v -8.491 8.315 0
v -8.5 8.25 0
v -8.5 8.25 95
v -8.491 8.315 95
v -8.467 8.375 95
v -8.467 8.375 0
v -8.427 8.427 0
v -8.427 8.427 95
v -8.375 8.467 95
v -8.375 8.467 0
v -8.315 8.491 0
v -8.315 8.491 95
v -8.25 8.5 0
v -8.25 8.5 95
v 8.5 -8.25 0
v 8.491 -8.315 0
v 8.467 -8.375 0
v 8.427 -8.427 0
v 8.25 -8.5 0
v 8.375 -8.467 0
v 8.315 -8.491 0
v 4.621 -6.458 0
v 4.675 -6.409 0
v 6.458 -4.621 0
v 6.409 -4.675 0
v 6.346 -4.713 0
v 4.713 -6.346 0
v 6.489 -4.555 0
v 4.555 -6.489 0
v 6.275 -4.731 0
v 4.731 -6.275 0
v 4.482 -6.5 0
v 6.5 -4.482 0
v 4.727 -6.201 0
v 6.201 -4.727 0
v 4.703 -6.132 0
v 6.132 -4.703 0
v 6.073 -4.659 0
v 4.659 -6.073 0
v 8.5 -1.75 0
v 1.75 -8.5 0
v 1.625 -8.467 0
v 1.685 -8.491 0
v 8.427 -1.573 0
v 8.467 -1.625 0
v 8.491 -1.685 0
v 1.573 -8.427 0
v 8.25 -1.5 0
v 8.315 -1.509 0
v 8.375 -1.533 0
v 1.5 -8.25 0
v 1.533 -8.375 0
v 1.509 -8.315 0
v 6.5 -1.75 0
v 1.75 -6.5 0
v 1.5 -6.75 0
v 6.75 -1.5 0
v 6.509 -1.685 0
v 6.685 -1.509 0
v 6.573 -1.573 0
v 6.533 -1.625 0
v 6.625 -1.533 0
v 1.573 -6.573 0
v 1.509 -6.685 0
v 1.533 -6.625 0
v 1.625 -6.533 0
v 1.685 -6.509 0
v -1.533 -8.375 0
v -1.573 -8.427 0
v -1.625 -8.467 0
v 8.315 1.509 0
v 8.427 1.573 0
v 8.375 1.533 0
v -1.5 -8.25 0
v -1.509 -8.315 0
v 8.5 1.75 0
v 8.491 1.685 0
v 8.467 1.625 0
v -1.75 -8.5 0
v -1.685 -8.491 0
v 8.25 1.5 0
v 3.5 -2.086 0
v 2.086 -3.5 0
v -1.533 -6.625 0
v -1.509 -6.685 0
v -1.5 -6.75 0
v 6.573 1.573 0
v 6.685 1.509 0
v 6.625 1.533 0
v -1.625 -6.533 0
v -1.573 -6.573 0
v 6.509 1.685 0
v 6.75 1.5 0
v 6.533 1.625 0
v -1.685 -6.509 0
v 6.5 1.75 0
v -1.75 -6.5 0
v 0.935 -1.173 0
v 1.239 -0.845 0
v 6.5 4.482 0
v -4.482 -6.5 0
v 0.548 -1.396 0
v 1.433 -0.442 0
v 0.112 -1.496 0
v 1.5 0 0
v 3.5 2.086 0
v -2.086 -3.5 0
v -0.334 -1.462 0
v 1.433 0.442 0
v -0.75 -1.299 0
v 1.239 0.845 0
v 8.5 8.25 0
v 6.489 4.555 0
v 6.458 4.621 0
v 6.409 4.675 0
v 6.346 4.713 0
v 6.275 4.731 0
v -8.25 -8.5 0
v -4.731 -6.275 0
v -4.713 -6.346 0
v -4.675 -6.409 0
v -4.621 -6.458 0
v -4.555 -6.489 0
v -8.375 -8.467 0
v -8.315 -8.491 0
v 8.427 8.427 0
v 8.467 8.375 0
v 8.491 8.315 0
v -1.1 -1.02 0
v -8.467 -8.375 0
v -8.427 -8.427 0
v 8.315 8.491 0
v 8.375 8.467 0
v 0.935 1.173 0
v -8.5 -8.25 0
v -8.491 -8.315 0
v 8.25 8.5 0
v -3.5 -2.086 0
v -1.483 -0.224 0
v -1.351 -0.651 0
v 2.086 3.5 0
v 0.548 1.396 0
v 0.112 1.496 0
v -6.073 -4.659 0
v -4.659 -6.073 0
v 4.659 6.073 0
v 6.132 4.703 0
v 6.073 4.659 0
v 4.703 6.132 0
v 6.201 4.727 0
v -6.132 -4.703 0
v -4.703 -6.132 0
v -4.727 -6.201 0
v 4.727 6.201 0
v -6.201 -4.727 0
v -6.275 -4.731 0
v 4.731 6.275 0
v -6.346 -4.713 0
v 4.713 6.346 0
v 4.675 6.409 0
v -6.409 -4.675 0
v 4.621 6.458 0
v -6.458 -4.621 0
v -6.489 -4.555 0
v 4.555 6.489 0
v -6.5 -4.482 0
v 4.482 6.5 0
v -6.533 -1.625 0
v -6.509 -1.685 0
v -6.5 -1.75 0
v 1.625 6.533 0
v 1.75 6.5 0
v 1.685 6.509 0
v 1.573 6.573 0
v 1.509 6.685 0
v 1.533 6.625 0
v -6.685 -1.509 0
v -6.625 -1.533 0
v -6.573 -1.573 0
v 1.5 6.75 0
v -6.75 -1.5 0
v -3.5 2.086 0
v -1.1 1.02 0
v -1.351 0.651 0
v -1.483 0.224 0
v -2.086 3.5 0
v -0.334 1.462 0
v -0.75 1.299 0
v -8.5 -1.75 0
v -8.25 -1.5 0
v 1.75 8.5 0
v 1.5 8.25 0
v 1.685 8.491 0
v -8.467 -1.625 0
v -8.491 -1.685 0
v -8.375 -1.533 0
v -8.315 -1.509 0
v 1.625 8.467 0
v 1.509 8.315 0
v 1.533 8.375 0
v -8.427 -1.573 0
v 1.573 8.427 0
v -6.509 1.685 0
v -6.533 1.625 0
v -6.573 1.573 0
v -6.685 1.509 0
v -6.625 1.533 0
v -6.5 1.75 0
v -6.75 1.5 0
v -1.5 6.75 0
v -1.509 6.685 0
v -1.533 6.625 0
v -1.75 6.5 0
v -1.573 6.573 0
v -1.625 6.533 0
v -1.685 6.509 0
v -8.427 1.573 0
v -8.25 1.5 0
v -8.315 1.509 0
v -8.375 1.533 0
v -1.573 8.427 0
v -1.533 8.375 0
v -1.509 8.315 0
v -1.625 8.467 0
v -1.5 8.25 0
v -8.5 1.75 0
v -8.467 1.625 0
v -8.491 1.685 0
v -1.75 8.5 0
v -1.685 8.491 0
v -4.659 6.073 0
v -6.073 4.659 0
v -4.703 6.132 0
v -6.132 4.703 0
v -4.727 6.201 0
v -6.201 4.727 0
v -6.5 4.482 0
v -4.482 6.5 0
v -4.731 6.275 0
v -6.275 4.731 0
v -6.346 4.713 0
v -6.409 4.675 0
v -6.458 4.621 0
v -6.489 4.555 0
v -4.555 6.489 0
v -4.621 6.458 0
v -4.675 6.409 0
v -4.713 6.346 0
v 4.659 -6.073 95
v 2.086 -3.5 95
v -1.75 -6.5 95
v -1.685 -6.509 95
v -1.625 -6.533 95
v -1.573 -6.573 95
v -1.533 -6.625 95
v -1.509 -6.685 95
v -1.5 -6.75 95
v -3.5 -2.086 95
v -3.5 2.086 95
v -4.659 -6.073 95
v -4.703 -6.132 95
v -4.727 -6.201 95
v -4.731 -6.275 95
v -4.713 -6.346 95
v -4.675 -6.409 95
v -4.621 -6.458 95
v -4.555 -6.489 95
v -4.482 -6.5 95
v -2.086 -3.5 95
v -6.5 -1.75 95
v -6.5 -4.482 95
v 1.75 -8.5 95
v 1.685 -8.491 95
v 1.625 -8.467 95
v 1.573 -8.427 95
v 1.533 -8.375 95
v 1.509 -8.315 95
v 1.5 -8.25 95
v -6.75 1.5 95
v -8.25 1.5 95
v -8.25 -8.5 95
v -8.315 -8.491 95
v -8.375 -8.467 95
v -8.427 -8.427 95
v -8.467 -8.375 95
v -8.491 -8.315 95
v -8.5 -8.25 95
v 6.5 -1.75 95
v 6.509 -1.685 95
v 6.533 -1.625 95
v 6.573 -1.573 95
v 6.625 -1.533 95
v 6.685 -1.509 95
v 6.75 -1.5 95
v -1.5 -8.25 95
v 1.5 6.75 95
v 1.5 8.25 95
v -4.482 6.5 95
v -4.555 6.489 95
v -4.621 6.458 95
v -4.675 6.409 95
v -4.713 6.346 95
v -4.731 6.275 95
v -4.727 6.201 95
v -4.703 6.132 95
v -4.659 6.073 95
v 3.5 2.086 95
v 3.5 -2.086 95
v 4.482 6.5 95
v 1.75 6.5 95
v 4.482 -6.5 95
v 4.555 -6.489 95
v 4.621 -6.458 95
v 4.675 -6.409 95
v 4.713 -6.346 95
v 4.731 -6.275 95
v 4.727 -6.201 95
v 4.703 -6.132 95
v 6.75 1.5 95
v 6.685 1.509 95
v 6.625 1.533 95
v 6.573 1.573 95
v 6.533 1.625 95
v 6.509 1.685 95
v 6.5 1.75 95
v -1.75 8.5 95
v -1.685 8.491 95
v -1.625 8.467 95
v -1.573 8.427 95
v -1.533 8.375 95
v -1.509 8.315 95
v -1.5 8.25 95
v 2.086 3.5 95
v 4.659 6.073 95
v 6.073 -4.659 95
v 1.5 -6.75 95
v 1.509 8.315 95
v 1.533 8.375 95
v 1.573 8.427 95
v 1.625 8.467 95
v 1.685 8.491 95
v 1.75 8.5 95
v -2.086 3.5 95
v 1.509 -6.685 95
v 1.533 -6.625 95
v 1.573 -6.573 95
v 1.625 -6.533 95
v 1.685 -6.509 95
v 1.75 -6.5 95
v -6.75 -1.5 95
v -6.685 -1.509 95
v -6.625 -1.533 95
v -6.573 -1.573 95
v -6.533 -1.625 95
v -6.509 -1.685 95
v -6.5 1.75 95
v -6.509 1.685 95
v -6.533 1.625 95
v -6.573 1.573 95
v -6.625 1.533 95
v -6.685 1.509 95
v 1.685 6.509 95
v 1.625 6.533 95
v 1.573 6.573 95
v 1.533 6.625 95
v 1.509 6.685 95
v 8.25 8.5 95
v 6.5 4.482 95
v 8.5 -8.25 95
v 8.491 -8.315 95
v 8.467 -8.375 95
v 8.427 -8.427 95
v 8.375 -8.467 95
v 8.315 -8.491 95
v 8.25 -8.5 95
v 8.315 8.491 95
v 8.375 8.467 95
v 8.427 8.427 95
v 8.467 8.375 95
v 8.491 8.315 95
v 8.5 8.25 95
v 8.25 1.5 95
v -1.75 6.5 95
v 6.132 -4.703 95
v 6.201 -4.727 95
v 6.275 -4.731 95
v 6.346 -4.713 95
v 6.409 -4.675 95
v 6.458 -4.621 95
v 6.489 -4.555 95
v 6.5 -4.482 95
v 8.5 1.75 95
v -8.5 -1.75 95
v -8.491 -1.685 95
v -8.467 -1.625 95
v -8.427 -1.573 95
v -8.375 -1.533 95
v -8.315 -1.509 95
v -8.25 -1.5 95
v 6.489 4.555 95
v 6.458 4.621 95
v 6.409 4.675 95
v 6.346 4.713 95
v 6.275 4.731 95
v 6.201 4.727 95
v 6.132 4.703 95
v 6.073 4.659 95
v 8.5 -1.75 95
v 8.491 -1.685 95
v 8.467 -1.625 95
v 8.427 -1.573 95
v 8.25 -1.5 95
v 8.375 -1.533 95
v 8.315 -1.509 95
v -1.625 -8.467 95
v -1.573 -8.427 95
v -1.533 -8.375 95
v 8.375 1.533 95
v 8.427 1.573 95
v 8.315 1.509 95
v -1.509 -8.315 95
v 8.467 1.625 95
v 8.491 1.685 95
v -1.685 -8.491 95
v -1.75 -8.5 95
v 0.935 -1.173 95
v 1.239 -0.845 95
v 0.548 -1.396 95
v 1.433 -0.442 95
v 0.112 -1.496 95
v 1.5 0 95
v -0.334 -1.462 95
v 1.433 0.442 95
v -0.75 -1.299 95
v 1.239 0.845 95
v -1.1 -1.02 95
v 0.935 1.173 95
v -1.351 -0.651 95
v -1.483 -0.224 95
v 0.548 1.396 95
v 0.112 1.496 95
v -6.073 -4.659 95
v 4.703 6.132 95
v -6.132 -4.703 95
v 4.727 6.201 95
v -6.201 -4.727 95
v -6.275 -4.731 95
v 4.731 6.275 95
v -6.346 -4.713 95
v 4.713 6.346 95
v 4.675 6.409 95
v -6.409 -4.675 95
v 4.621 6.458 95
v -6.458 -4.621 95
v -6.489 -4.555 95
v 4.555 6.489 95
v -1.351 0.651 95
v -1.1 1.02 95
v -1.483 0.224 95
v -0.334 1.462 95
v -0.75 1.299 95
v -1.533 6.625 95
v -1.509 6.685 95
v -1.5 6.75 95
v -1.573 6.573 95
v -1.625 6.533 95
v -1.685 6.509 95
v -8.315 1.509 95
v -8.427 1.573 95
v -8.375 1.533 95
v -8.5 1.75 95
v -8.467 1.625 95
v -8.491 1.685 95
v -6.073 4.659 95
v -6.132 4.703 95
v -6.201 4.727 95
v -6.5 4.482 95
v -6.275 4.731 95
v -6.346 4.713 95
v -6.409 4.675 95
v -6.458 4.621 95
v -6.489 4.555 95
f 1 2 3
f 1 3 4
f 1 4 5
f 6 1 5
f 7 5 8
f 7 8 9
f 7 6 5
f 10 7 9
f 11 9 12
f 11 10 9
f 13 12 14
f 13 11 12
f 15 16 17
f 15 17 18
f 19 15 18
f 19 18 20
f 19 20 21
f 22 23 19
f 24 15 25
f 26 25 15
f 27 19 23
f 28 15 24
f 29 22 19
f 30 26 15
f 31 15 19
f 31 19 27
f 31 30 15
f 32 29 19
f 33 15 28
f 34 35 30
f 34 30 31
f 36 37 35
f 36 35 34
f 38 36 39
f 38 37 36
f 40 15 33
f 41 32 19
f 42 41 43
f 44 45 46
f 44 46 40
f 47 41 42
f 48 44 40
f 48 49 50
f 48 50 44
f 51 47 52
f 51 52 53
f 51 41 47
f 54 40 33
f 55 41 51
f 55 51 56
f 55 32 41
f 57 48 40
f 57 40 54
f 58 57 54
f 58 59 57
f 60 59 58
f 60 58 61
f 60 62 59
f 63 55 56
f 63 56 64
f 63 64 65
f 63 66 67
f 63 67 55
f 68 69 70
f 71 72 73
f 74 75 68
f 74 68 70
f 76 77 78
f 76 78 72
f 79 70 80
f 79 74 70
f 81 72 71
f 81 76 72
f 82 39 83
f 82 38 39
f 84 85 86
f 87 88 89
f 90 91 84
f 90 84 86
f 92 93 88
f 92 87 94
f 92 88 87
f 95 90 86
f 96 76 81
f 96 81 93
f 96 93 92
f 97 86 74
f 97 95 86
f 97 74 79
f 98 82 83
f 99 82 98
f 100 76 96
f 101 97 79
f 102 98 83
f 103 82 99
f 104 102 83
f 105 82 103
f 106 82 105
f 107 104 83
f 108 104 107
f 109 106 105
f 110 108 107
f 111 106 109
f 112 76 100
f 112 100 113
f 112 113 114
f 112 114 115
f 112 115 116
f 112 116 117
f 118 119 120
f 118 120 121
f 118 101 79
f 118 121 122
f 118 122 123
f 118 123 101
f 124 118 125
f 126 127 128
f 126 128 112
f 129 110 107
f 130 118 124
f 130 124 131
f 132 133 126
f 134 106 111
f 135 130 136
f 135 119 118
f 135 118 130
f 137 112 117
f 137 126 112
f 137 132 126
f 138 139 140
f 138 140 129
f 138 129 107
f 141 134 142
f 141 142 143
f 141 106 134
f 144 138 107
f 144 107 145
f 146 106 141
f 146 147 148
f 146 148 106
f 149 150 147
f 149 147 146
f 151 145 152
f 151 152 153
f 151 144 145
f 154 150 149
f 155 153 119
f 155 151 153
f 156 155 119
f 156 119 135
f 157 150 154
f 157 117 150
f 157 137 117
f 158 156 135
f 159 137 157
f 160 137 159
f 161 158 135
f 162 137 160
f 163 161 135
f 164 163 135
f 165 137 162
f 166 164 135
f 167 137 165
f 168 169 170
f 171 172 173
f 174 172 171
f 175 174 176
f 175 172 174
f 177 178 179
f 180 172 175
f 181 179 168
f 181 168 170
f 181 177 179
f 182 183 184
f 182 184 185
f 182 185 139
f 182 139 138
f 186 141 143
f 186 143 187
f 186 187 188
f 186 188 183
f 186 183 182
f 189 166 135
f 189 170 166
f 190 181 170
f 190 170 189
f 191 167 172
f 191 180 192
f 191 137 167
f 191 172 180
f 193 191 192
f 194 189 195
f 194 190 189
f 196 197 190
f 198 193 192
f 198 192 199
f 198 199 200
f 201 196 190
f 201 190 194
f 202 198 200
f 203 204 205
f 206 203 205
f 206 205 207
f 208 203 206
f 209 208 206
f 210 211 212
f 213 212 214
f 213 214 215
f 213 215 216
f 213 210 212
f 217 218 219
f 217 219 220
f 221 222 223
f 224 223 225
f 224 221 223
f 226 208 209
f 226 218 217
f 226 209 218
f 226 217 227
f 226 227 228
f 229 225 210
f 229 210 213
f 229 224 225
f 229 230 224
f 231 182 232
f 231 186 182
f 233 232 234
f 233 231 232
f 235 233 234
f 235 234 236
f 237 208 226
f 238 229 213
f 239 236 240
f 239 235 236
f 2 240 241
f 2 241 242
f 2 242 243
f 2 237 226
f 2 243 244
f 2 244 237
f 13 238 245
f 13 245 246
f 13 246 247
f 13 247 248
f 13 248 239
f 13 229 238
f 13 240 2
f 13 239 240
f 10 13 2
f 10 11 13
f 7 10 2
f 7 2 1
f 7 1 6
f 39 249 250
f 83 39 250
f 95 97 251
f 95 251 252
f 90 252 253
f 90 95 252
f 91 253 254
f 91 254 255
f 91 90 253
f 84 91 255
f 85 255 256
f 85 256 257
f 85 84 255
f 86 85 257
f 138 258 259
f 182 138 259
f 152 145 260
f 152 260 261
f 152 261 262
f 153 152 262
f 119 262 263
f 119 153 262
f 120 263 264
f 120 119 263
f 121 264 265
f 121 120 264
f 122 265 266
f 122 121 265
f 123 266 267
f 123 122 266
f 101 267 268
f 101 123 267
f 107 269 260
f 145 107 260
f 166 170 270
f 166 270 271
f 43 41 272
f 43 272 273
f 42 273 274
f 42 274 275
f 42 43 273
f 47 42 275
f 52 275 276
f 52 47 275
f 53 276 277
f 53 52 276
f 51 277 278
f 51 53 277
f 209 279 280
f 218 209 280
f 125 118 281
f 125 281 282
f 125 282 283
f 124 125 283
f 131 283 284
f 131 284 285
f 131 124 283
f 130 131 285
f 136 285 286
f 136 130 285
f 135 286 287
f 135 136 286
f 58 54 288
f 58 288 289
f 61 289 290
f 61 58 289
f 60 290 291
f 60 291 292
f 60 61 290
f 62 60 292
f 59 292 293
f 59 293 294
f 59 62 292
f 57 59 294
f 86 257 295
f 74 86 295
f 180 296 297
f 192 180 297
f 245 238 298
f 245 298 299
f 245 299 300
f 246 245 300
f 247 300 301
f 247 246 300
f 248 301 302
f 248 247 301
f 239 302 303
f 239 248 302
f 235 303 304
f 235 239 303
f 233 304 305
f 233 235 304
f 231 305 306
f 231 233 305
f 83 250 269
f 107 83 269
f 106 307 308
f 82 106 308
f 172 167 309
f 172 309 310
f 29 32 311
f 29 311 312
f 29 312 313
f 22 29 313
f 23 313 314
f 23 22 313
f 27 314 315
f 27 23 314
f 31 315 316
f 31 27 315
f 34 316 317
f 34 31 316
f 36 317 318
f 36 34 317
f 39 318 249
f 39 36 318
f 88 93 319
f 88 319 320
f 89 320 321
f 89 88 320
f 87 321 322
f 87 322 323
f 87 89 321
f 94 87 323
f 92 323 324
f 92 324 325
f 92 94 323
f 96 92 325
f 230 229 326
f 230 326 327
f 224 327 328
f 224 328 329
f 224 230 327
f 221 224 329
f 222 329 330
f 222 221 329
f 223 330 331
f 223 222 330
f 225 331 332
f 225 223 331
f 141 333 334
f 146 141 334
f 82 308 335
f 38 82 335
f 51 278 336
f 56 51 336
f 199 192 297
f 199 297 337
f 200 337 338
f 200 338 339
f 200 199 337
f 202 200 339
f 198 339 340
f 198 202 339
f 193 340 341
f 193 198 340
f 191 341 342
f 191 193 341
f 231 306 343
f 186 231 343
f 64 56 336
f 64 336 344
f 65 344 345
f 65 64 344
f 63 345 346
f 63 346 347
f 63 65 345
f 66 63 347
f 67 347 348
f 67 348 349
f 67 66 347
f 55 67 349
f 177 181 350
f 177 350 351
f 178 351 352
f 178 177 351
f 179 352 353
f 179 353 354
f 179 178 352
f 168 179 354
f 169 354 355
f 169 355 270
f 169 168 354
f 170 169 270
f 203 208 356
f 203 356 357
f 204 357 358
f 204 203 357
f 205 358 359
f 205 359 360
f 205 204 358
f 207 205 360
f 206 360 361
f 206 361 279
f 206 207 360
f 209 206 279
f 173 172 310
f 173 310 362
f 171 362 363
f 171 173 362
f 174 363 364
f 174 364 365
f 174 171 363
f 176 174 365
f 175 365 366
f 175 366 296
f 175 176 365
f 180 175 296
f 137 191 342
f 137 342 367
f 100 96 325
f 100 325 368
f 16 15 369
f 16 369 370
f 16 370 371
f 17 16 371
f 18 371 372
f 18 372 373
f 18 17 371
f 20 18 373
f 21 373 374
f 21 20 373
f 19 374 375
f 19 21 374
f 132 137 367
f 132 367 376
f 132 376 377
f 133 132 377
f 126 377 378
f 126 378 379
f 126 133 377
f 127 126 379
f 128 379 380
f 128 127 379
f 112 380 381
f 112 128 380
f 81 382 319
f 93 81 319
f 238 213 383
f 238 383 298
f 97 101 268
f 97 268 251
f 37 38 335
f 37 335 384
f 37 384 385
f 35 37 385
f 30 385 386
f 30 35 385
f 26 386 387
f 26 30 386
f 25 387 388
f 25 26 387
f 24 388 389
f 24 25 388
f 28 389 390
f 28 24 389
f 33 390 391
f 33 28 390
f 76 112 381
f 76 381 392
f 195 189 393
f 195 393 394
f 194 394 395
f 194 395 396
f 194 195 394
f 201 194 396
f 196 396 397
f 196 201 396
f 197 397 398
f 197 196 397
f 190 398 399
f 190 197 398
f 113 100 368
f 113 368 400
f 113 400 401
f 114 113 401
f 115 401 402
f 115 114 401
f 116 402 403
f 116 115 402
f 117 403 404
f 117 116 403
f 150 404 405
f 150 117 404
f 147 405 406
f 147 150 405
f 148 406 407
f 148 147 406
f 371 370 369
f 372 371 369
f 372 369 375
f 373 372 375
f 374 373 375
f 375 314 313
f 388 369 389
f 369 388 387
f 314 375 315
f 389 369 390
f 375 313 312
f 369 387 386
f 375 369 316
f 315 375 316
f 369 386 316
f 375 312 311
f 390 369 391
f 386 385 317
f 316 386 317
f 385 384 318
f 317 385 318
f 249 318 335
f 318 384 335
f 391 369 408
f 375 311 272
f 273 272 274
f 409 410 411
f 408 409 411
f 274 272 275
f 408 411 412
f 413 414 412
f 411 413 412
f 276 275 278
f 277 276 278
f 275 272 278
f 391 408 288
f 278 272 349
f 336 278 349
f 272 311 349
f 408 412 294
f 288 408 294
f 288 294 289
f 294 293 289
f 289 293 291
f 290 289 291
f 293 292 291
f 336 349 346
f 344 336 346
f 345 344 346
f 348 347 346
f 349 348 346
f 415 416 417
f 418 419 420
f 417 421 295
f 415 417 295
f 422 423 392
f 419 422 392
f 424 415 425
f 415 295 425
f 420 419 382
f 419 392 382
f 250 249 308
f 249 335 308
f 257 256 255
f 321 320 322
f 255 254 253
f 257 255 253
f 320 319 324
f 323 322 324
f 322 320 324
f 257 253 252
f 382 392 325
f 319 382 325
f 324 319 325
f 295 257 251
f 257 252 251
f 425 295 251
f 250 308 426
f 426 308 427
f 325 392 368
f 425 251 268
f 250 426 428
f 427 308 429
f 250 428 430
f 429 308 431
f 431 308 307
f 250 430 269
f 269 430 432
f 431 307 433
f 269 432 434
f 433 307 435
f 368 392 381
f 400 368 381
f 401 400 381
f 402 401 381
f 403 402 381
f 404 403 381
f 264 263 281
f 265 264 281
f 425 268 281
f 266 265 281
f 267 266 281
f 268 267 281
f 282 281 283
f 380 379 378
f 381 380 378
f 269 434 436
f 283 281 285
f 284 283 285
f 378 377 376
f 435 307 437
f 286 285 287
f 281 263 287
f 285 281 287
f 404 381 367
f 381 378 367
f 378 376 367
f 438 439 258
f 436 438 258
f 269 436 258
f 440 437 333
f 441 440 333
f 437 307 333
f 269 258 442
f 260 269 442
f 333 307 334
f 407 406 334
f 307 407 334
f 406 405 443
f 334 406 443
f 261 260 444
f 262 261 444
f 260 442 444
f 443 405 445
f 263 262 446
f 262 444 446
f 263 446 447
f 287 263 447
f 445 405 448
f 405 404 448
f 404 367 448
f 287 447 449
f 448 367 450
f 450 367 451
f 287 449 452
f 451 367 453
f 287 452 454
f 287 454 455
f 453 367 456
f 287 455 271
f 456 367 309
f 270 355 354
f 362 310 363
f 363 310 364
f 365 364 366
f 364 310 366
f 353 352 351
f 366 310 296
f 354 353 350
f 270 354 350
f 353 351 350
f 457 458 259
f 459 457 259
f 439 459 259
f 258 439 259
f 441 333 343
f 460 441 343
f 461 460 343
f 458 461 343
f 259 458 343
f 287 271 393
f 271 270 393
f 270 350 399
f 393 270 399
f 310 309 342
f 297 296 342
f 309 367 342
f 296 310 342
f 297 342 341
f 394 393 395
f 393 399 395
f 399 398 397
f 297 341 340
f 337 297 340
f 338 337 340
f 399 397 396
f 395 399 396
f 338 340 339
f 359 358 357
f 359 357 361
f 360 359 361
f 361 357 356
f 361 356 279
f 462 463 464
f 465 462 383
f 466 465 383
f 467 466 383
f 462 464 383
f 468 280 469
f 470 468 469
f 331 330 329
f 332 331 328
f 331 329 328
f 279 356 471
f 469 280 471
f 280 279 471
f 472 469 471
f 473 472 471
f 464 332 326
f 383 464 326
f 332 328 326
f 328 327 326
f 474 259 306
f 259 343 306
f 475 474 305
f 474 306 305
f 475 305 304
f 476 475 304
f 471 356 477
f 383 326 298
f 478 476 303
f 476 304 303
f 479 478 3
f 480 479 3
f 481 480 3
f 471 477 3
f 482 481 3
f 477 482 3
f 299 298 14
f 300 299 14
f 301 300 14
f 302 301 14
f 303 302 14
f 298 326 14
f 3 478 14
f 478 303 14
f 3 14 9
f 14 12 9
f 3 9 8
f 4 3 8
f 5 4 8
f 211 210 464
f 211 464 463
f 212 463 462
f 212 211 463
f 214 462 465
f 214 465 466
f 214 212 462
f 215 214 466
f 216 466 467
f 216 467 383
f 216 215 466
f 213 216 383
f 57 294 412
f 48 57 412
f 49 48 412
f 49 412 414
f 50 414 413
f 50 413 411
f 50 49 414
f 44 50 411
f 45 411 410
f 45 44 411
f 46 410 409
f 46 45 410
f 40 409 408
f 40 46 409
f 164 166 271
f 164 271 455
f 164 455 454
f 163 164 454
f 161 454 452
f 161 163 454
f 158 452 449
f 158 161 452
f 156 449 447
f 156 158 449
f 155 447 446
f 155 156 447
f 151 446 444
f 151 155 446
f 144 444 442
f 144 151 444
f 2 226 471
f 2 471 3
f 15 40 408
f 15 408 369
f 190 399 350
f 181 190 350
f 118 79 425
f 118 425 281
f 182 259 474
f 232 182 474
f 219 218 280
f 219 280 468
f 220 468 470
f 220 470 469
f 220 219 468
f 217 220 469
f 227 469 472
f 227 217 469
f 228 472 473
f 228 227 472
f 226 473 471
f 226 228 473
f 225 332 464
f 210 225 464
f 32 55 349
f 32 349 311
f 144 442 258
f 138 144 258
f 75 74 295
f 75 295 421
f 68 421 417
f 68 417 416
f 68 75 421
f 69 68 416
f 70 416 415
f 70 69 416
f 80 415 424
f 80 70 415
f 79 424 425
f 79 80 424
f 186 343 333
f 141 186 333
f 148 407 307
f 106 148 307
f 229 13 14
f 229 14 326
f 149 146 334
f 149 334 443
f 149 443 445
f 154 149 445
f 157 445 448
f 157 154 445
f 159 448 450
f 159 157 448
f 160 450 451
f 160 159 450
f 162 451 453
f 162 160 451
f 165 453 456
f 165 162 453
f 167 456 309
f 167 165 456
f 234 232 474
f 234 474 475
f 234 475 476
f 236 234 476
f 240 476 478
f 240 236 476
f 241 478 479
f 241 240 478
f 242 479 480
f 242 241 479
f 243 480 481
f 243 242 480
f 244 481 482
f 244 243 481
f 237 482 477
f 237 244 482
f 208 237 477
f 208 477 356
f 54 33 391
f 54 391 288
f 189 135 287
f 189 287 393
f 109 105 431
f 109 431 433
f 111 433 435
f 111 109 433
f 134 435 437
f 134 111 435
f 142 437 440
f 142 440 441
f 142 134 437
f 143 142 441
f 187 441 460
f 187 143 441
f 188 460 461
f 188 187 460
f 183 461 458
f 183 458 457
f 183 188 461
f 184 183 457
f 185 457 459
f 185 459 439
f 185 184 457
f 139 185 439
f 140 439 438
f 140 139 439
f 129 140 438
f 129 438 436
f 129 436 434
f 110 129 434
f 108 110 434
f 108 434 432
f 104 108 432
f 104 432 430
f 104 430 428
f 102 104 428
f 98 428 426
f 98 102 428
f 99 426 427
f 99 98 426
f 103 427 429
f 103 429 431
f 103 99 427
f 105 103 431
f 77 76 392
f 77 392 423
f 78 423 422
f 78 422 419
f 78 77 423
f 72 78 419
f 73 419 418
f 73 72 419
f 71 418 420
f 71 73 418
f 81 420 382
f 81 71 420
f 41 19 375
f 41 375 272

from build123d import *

# Parameters (mm, degrees)
SKETCH1_R           = 1.5
BOSS_EXTRUDE1_DEPTH = 95


with BuildPart() as part:
    # Sketch1 → Boss-Extrude1 (new body)
    with BuildSketch(Plane.XY):
        with BuildLine():
            Line((-2.085786438, 3.5), (2.085786438, 3.5))
            Line((2.085786438, 3.5), (4.659009742, 6.073223305))
            ThreePointArc((4.659009742, 6.073223305), (4.71320293, 6.345670858), (4.482233047, 6.5))
            Line((4.482233047, 6.5), (1.75, 6.5))
            ThreePointArc((1.75, 6.5), (1.573223305, 6.573223305), (1.5, 6.75))
            Line((1.5, 6.75), (1.5, 8.25))
            ThreePointArc((1.5, 8.25), (1.573223305, 8.426776695), (1.75, 8.5))
            Line((1.75, 8.5), (8.25, 8.5))
            ThreePointArc((8.25, 8.5), (8.426776695, 8.426776695), (8.5, 8.25))
            Line((8.5, 8.25), (8.5, 1.75))
            ThreePointArc((8.5, 1.75), (8.426776695, 1.573223305), (8.25, 1.5))
            Line((8.25, 1.5), (6.75, 1.5))
            ThreePointArc((6.75, 1.5), (6.573223305, 1.573223305), (6.5, 1.75))
            Line((6.5, 1.75), (6.5, 4.482233047))
            ThreePointArc((6.5, 4.482233047), (6.345670858, 4.71320293), (6.073223305, 4.659009742))
            Line((6.073223305, 4.659009742), (3.5, 2.085786438))
            Line((3.5, 2.085786438), (3.5, -2.085786438))
            Line((3.5, -2.085786438), (6.073223305, -4.659009742))
            ThreePointArc((6.073223305, -4.659009742), (6.345670858, -4.71320293), (6.5, -4.482233047))
            Line((6.5, -4.482233047), (6.5, -1.75))
            ThreePointArc((6.5, -1.75), (6.573223305, -1.573223305), (6.75, -1.5))
            Line((6.75, -1.5), (8.25, -1.5))
            ThreePointArc((8.25, -1.5), (8.426776695, -1.573223305), (8.5, -1.75))
            Line((8.5, -1.75), (8.5, -8.25))
            ThreePointArc((8.5, -8.25), (8.426776695, -8.426776695), (8.25, -8.5))
            Line((8.25, -8.5), (1.75, -8.5))
            ThreePointArc((1.75, -8.5), (1.573223305, -8.426776695), (1.5, -8.25))
            Line((1.5, -8.25), (1.5, -6.75))
            ThreePointArc((1.5, -6.75), (1.573223305, -6.573223305), (1.75, -6.5))
            Line((1.75, -6.5), (4.482233047, -6.5))
            ThreePointArc((4.482233047, -6.5), (4.71320293, -6.345670858), (4.659009742, -6.073223305))
            Line((4.659009742, -6.073223305), (2.085786438, -3.5))
            Line((2.085786438, -3.5), (-2.085786438, -3.5))
            Line((-2.085786438, -3.5), (-4.659009742, -6.073223305))
            ThreePointArc((-4.659009742, -6.073223305), (-4.71320293, -6.345670858), (-4.482233047, -6.5))
            Line((-4.482233047, -6.5), (-1.75, -6.5))
            ThreePointArc((-1.75, -6.5), (-1.573223305, -6.573223305), (-1.5, -6.75))
            Line((-1.5, -6.75), (-1.5, -8.25))
            ThreePointArc((-1.5, -8.25), (-1.573223305, -8.426776695), (-1.75, -8.5))
            Line((-1.75, -8.5), (-8.25, -8.5))
            ThreePointArc((-8.25, -8.5), (-8.426776695, -8.426776695), (-8.5, -8.25))
            Line((-8.5, -8.25), (-8.5, -1.75))
            ThreePointArc((-8.5, -1.75), (-8.426776695, -1.573223305), (-8.25, -1.5))
            Line((-8.25, -1.5), (-6.75, -1.5))
            ThreePointArc((-6.75, -1.5), (-6.573223305, -1.573223305), (-6.5, -1.75))
            Line((-6.5, -1.75), (-6.5, -4.482233047))
            ThreePointArc((-6.5, -4.482233047), (-6.345670858, -4.71320293), (-6.073223305, -4.659009742))
            Line((-6.073223305, -4.659009742), (-3.5, -2.085786438))
            Line((-3.5, -2.085786438), (-3.5, 2.085786438))
            Line((-3.5, 2.085786438), (-6.073223305, 4.659009742))
            ThreePointArc((-6.073223305, 4.659009742), (-6.345670858, 4.71320293), (-6.5, 4.482233047))
            Line((-6.5, 4.482233047), (-6.5, 1.75))
            ThreePointArc((-6.5, 1.75), (-6.573223305, 1.573223305), (-6.75, 1.5))
            Line((-6.75, 1.5), (-8.25, 1.5))
            ThreePointArc((-8.25, 1.5), (-8.426776695, 1.573223305), (-8.5, 1.75))
            Line((-8.5, 1.75), (-8.5, 8.25))
            ThreePointArc((-8.5, 8.25), (-8.426776695, 8.426776695), (-8.25, 8.5))
            Line((-8.25, 8.5), (-1.75, 8.5))
            ThreePointArc((-1.75, 8.5), (-1.573223305, 8.426776695), (-1.5, 8.25))
            Line((-1.5, 8.25), (-1.5, 6.75))
            ThreePointArc((-1.5, 6.75), (-1.573223305, 6.573223305), (-1.75, 6.5))
            Line((-1.75, 6.5), (-4.482233047, 6.5))
            ThreePointArc((-4.482233047, 6.5), (-4.71320293, 6.345670858), (-4.659009742, 6.073223305))
            Line((-4.659009742, 6.073223305), (-2.085786438, 3.5))
        make_face()
        Circle(SKETCH1_R, mode=Mode.SUBTRACT)
    extrude(amount=BOSS_EXTRUDE1_DEPTH)


solid = part.part
